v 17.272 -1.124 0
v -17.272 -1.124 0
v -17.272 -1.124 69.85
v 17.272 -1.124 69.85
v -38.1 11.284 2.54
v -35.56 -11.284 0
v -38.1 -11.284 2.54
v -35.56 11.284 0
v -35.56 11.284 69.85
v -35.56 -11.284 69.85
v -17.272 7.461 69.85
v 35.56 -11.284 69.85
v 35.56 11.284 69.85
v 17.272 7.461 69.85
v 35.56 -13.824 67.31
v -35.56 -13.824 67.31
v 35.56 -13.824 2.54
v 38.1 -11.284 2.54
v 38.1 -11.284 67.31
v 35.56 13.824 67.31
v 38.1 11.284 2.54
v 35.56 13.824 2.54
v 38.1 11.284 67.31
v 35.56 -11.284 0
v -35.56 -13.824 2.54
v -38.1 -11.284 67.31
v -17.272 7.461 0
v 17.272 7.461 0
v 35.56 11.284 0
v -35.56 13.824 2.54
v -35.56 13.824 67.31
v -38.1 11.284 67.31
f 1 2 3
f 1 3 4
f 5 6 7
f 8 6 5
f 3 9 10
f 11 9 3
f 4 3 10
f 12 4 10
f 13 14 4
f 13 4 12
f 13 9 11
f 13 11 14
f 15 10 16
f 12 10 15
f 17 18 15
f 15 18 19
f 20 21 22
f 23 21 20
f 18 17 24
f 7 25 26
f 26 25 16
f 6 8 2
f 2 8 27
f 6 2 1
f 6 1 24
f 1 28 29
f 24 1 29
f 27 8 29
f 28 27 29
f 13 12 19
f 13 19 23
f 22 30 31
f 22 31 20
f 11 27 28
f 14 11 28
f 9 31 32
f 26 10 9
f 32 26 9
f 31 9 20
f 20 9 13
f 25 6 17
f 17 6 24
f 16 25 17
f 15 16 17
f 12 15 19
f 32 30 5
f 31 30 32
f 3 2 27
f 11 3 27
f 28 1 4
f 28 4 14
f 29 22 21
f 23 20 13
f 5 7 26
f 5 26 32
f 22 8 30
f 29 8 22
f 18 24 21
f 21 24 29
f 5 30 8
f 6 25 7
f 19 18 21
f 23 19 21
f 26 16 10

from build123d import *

# Parameters (mm, degrees)
F0_W     = 76.2
F0_H     = 27.6479
F0_W_2   = 34.544
F0_H_2   = 8.5852
F1_DEPTH = 69.85
F2_SIZE  = 2.54


with BuildPart() as f1:
    # F0 (on Top) → F1 (new body)
    with BuildSketch(Plane.XY):
        Rectangle(F0_W, F0_H)
        with Locations((0, 3.16865)):
            Rectangle(F0_W_2, F0_H_2, mode=Mode.SUBTRACT)
    extrude(amount=F1_DEPTH)

    # F2
    f2_edges = [f1.edges().sort_by_distance(p)[0] for p in [
        (38.1, -13.82395, 34.925),
        (-38.1, -13.82395, 34.925),
        (38.1, 13.82395, 34.925),
        (-38.1, 13.82395, 34.925),
        (0, 13.82395, 69.85),
        (0, -13.82395, 69.85),
        (0, -13.82395, 0),
        (0, 13.82395, 0),
        (-38.1, 0, 0),
        (38.1, 0, 0),
        (38.1, 0, 69.85),
        (-38.1, 0, 69.85),
    ]]
    chamfer(f2_edges, length=F2_SIZE)


solid = f1.part
